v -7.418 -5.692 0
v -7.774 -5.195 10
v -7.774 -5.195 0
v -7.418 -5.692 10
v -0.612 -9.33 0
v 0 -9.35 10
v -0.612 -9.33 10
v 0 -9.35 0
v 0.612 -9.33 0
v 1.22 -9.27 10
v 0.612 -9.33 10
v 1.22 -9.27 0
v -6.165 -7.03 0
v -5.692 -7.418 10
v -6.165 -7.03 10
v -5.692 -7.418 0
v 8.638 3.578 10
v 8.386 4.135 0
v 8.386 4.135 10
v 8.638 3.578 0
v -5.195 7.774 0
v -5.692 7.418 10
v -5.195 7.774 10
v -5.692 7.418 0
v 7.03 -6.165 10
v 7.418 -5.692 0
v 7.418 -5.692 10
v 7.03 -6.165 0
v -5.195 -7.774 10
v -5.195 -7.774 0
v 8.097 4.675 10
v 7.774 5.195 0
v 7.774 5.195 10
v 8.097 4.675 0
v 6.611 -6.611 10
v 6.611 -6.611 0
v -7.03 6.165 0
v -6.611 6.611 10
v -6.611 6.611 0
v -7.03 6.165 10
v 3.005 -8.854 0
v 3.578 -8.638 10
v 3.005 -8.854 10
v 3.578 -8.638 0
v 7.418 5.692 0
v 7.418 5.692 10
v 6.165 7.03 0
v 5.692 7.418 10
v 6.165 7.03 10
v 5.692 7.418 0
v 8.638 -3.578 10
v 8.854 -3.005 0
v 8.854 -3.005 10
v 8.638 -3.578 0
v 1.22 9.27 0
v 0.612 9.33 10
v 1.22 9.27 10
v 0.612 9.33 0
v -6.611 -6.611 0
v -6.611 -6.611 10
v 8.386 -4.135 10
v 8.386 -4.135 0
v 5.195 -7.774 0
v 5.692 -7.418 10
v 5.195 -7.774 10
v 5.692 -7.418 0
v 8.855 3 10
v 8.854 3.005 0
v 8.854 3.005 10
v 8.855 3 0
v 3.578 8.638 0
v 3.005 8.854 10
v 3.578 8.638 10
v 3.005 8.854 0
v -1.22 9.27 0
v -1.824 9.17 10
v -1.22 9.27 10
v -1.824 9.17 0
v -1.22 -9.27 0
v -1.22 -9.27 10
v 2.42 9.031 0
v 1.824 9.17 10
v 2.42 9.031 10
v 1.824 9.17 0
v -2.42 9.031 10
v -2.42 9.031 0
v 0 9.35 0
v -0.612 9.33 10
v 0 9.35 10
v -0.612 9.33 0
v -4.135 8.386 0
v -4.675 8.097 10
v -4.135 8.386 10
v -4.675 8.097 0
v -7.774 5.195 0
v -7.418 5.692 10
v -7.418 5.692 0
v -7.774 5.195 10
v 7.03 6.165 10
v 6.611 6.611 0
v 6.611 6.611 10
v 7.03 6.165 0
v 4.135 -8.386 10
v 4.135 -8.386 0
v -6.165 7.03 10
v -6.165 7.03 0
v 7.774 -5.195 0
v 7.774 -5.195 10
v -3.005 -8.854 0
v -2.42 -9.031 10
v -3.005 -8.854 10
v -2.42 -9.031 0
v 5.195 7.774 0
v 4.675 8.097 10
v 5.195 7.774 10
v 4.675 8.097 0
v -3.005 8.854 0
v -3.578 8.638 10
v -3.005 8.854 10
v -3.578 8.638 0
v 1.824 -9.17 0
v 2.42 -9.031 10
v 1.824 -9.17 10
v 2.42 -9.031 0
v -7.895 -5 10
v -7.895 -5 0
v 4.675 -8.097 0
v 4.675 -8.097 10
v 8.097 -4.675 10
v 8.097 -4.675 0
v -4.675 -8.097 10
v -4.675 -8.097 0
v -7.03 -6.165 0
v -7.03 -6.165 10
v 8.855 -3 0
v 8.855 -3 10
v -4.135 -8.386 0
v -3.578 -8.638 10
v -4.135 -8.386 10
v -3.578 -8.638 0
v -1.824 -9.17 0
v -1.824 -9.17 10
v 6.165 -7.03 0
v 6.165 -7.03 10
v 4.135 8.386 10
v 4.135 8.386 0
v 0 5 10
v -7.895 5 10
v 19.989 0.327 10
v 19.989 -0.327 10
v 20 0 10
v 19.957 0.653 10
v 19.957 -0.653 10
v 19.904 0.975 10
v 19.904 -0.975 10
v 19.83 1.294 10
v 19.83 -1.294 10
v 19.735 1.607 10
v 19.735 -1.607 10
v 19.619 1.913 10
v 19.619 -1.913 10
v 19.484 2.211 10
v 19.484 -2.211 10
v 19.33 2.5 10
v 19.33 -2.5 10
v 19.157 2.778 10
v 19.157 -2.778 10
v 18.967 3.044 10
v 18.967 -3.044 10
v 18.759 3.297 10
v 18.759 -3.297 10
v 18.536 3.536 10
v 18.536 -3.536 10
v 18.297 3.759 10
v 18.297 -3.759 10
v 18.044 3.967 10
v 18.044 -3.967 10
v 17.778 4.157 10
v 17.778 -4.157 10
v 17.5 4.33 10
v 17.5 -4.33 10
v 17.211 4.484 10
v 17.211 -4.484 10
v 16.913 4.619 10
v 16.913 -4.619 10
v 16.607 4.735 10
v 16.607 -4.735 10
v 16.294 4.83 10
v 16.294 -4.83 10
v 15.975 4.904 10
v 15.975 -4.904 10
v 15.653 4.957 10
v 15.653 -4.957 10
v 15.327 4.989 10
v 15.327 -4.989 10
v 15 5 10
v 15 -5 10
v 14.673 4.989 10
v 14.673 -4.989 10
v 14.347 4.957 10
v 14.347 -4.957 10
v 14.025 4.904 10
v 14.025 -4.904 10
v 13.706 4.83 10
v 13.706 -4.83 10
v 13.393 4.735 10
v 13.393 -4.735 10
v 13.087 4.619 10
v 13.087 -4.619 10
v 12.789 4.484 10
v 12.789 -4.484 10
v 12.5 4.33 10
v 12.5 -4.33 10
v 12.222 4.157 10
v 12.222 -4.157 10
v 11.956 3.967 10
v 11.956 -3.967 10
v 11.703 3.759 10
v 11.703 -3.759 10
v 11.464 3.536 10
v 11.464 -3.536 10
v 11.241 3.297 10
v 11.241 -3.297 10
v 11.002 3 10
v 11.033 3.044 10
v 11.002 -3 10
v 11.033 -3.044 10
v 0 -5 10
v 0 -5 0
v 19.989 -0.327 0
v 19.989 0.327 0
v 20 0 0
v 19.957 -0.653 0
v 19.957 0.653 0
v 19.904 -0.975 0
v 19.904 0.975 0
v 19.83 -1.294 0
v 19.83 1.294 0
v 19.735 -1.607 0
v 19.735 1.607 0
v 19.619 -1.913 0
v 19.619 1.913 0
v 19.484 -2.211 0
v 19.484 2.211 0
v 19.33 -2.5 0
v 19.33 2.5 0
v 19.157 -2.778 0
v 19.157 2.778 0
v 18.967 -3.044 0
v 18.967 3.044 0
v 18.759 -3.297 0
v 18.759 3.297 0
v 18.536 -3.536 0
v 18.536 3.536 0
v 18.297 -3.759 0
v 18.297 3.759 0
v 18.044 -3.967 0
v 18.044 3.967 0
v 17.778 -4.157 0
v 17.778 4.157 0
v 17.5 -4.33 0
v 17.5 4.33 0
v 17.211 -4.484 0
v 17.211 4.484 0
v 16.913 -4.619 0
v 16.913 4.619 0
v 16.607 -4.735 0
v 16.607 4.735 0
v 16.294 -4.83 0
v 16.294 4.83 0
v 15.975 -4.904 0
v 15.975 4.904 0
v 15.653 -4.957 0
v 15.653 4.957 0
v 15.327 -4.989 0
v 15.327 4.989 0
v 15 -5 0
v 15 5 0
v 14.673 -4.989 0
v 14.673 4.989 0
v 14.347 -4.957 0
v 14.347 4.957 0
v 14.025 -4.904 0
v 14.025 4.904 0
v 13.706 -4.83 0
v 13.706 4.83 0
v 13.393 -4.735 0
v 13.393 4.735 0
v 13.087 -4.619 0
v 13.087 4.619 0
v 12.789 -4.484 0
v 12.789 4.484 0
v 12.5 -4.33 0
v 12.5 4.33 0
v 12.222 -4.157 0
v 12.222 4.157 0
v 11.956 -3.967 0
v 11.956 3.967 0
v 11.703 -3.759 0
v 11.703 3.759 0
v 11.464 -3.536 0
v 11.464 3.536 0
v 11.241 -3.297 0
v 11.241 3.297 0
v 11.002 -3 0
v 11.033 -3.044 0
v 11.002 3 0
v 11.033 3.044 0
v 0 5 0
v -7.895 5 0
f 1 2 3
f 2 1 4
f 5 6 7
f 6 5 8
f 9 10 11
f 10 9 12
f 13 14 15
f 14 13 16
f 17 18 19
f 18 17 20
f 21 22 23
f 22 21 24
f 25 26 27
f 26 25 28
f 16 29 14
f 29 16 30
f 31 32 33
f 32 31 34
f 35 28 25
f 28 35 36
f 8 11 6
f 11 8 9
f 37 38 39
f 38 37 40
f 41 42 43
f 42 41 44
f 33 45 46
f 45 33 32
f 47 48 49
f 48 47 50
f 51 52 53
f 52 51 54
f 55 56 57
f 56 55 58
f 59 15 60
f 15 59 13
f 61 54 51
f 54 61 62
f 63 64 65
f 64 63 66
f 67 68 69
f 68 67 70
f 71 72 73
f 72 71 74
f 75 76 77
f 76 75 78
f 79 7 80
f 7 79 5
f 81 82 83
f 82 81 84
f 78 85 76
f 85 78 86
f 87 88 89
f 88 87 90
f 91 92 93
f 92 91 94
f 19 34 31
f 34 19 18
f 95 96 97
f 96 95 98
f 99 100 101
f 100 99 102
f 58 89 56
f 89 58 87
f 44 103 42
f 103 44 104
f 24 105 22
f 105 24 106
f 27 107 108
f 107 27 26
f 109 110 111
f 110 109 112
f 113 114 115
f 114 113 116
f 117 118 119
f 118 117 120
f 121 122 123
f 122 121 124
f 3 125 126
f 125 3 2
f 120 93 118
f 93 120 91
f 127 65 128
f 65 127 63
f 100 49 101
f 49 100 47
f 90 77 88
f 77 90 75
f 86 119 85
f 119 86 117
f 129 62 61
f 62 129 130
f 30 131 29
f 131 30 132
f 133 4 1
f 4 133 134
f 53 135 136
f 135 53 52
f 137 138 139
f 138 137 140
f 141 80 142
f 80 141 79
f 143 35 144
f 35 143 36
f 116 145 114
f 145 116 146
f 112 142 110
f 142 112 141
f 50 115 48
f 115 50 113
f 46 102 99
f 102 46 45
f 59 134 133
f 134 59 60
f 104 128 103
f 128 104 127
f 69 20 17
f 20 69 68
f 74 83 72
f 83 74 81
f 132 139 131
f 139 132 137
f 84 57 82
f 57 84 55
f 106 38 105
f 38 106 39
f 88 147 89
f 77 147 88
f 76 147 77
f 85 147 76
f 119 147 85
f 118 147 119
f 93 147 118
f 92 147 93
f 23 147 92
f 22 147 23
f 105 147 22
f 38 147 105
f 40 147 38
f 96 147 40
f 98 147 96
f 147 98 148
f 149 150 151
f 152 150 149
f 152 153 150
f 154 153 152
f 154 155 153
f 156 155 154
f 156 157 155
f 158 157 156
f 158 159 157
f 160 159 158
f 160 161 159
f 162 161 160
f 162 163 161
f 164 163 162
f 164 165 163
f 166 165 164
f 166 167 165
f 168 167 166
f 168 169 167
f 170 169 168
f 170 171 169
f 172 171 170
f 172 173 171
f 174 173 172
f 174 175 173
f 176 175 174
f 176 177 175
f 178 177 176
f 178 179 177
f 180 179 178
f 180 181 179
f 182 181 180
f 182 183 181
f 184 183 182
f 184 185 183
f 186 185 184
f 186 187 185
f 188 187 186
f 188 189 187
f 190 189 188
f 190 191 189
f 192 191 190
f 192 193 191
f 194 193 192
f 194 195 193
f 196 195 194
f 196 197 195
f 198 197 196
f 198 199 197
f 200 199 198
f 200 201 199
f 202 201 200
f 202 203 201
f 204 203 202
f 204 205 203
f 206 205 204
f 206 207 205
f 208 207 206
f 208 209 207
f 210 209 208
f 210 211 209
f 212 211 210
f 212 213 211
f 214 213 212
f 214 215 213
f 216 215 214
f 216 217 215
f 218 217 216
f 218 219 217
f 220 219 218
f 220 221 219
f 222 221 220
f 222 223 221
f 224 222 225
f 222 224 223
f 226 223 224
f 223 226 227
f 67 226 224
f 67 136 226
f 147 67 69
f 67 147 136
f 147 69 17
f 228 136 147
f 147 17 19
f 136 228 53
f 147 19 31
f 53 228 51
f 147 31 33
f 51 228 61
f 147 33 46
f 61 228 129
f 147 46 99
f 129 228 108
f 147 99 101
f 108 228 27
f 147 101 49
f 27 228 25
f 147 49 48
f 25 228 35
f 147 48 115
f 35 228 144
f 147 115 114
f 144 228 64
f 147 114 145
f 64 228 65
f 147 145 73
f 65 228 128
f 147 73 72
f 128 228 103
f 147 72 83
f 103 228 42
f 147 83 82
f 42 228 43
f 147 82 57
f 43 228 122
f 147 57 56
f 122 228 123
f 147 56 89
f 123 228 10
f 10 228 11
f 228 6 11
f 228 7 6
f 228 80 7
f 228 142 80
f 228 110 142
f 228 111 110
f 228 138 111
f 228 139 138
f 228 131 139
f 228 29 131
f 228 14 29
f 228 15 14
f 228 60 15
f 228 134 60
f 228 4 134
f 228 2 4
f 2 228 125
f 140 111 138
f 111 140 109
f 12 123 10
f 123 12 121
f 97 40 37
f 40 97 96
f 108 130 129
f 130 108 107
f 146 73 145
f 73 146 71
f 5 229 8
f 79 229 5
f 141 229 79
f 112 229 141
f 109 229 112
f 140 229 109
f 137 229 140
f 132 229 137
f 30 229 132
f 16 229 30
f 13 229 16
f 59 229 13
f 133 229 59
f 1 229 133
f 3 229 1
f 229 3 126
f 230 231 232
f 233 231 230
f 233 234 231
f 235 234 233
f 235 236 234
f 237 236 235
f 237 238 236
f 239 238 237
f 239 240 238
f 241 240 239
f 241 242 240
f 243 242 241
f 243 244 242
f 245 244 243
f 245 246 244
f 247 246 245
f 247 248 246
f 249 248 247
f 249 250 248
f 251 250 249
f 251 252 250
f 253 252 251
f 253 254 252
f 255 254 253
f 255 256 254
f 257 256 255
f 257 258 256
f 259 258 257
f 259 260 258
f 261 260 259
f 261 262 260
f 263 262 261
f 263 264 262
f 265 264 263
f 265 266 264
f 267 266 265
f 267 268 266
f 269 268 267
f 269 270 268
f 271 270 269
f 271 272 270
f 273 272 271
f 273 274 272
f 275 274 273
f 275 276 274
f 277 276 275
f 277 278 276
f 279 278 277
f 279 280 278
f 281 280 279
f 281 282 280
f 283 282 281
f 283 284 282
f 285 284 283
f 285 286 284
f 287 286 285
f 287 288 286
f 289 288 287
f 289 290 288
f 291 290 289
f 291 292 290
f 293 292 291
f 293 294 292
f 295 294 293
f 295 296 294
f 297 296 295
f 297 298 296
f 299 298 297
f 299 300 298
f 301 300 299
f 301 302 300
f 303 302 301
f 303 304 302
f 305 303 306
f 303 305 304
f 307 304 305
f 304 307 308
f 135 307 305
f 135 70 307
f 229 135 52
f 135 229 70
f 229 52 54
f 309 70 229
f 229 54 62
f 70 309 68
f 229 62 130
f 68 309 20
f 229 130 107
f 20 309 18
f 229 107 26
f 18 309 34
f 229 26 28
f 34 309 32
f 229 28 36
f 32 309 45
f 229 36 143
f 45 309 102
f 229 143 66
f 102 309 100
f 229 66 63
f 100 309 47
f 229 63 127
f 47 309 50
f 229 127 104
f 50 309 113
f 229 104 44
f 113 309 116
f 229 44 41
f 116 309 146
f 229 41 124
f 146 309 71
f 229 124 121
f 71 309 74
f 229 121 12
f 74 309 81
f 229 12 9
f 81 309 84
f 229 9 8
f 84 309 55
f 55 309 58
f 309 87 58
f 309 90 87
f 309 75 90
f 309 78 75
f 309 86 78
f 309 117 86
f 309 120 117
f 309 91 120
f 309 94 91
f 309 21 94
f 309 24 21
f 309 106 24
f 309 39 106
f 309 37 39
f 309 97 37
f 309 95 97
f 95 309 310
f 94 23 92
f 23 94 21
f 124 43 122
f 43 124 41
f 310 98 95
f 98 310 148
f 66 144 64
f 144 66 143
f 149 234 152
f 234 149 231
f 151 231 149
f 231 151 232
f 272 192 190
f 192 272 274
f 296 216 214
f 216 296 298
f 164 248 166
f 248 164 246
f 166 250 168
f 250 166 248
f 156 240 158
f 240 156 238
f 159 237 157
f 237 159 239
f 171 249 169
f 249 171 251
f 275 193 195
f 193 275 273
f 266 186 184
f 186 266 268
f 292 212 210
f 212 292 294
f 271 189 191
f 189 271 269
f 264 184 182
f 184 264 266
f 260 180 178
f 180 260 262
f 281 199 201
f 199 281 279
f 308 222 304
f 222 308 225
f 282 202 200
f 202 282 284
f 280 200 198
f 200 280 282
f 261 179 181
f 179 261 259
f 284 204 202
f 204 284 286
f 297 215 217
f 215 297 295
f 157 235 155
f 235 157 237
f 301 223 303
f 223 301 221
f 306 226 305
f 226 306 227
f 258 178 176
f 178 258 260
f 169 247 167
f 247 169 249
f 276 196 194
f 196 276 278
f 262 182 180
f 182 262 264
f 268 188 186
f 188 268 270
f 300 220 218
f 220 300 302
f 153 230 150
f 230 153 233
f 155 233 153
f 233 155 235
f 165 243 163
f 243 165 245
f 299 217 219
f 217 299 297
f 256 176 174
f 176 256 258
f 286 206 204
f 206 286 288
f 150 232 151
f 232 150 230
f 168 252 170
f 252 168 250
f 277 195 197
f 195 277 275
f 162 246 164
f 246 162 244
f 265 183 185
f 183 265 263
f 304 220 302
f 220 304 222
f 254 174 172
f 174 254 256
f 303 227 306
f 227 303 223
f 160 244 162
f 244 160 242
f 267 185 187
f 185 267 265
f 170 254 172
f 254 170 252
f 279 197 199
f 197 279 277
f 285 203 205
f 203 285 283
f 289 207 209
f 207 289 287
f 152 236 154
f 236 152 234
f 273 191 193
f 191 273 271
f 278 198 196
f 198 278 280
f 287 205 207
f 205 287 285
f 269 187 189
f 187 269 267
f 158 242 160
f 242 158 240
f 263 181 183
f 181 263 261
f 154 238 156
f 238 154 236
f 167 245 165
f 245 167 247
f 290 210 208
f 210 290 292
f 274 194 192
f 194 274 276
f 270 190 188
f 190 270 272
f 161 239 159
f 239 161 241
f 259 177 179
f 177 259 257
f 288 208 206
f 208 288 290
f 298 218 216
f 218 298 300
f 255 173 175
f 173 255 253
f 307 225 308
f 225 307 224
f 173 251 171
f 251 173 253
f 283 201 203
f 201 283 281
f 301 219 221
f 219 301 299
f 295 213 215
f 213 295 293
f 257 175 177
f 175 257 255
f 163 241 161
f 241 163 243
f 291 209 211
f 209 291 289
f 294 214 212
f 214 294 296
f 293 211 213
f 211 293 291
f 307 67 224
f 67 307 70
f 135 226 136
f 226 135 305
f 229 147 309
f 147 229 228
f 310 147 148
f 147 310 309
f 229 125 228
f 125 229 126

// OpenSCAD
// Tubing organiser clip for a 12.7 mm lab stand rod
// Print orientation: flat on the bed, z = 0 up to z = 10

// ---------- Parameters ----------
ring_d      = 12.7;   // rod ring inner diameter
ring_wall   = 3;      // rod ring wall thickness
ring_outer  = ring_d + 2 * ring_wall;  // 18.7 mm
opening_w   = 10;     // rod ring opening width (y span)

tub_d       = 6;      // tubing ring inner diameter
tub_wall    = 2;      // tubing ring wall thickness
tub_outer   = tub_d + 2 * tub_wall;    // 10 mm
tub_x       = 15;     // tubing ring centre X
tub_opening = 4.5;    // tubing ring opening width (x > tub_x)

bridge_w    = 6;      // bridge width in Y
bridge_x0   = 8;      // bridge start X
bridge_x1   = 12;     // bridge end X

eps         = 0.5;    // cutter overshoot past faces
$fn         = 96;     // curve resolution

// ---------- Model ----------
difference() {
    union() {
        // Rod ring, centred at origin
        cylinder(d = ring_outer, h = 10);

        // Tubing ring, centred at x = 15, y = 0
        translate([tub_x, 0, 0])
            cylinder(d = tub_outer, h = 10);

        // Solid bridge between x = 8 and x = 12
        translate([bridge_x0, -bridge_w / 2, 0])
            cube([bridge_x1 - bridge_x0, bridge_w, 10]);
    }

    // Opening in rod ring: -X side, -5 < y < 5
    translate([-ring_outer / 2 - eps, -opening_w / 2, -eps])
        cube([ring_outer / 2 + eps, opening_w, 10 + 2 * eps]);

    // Opening in tubing ring: +X side, -2.25 < y < 2.25
    translate([tub_x, -tub_opening / 2, -eps])
        cube([tub_outer - tub_x + eps, tub_opening, 10 + 2 * eps]);
}
